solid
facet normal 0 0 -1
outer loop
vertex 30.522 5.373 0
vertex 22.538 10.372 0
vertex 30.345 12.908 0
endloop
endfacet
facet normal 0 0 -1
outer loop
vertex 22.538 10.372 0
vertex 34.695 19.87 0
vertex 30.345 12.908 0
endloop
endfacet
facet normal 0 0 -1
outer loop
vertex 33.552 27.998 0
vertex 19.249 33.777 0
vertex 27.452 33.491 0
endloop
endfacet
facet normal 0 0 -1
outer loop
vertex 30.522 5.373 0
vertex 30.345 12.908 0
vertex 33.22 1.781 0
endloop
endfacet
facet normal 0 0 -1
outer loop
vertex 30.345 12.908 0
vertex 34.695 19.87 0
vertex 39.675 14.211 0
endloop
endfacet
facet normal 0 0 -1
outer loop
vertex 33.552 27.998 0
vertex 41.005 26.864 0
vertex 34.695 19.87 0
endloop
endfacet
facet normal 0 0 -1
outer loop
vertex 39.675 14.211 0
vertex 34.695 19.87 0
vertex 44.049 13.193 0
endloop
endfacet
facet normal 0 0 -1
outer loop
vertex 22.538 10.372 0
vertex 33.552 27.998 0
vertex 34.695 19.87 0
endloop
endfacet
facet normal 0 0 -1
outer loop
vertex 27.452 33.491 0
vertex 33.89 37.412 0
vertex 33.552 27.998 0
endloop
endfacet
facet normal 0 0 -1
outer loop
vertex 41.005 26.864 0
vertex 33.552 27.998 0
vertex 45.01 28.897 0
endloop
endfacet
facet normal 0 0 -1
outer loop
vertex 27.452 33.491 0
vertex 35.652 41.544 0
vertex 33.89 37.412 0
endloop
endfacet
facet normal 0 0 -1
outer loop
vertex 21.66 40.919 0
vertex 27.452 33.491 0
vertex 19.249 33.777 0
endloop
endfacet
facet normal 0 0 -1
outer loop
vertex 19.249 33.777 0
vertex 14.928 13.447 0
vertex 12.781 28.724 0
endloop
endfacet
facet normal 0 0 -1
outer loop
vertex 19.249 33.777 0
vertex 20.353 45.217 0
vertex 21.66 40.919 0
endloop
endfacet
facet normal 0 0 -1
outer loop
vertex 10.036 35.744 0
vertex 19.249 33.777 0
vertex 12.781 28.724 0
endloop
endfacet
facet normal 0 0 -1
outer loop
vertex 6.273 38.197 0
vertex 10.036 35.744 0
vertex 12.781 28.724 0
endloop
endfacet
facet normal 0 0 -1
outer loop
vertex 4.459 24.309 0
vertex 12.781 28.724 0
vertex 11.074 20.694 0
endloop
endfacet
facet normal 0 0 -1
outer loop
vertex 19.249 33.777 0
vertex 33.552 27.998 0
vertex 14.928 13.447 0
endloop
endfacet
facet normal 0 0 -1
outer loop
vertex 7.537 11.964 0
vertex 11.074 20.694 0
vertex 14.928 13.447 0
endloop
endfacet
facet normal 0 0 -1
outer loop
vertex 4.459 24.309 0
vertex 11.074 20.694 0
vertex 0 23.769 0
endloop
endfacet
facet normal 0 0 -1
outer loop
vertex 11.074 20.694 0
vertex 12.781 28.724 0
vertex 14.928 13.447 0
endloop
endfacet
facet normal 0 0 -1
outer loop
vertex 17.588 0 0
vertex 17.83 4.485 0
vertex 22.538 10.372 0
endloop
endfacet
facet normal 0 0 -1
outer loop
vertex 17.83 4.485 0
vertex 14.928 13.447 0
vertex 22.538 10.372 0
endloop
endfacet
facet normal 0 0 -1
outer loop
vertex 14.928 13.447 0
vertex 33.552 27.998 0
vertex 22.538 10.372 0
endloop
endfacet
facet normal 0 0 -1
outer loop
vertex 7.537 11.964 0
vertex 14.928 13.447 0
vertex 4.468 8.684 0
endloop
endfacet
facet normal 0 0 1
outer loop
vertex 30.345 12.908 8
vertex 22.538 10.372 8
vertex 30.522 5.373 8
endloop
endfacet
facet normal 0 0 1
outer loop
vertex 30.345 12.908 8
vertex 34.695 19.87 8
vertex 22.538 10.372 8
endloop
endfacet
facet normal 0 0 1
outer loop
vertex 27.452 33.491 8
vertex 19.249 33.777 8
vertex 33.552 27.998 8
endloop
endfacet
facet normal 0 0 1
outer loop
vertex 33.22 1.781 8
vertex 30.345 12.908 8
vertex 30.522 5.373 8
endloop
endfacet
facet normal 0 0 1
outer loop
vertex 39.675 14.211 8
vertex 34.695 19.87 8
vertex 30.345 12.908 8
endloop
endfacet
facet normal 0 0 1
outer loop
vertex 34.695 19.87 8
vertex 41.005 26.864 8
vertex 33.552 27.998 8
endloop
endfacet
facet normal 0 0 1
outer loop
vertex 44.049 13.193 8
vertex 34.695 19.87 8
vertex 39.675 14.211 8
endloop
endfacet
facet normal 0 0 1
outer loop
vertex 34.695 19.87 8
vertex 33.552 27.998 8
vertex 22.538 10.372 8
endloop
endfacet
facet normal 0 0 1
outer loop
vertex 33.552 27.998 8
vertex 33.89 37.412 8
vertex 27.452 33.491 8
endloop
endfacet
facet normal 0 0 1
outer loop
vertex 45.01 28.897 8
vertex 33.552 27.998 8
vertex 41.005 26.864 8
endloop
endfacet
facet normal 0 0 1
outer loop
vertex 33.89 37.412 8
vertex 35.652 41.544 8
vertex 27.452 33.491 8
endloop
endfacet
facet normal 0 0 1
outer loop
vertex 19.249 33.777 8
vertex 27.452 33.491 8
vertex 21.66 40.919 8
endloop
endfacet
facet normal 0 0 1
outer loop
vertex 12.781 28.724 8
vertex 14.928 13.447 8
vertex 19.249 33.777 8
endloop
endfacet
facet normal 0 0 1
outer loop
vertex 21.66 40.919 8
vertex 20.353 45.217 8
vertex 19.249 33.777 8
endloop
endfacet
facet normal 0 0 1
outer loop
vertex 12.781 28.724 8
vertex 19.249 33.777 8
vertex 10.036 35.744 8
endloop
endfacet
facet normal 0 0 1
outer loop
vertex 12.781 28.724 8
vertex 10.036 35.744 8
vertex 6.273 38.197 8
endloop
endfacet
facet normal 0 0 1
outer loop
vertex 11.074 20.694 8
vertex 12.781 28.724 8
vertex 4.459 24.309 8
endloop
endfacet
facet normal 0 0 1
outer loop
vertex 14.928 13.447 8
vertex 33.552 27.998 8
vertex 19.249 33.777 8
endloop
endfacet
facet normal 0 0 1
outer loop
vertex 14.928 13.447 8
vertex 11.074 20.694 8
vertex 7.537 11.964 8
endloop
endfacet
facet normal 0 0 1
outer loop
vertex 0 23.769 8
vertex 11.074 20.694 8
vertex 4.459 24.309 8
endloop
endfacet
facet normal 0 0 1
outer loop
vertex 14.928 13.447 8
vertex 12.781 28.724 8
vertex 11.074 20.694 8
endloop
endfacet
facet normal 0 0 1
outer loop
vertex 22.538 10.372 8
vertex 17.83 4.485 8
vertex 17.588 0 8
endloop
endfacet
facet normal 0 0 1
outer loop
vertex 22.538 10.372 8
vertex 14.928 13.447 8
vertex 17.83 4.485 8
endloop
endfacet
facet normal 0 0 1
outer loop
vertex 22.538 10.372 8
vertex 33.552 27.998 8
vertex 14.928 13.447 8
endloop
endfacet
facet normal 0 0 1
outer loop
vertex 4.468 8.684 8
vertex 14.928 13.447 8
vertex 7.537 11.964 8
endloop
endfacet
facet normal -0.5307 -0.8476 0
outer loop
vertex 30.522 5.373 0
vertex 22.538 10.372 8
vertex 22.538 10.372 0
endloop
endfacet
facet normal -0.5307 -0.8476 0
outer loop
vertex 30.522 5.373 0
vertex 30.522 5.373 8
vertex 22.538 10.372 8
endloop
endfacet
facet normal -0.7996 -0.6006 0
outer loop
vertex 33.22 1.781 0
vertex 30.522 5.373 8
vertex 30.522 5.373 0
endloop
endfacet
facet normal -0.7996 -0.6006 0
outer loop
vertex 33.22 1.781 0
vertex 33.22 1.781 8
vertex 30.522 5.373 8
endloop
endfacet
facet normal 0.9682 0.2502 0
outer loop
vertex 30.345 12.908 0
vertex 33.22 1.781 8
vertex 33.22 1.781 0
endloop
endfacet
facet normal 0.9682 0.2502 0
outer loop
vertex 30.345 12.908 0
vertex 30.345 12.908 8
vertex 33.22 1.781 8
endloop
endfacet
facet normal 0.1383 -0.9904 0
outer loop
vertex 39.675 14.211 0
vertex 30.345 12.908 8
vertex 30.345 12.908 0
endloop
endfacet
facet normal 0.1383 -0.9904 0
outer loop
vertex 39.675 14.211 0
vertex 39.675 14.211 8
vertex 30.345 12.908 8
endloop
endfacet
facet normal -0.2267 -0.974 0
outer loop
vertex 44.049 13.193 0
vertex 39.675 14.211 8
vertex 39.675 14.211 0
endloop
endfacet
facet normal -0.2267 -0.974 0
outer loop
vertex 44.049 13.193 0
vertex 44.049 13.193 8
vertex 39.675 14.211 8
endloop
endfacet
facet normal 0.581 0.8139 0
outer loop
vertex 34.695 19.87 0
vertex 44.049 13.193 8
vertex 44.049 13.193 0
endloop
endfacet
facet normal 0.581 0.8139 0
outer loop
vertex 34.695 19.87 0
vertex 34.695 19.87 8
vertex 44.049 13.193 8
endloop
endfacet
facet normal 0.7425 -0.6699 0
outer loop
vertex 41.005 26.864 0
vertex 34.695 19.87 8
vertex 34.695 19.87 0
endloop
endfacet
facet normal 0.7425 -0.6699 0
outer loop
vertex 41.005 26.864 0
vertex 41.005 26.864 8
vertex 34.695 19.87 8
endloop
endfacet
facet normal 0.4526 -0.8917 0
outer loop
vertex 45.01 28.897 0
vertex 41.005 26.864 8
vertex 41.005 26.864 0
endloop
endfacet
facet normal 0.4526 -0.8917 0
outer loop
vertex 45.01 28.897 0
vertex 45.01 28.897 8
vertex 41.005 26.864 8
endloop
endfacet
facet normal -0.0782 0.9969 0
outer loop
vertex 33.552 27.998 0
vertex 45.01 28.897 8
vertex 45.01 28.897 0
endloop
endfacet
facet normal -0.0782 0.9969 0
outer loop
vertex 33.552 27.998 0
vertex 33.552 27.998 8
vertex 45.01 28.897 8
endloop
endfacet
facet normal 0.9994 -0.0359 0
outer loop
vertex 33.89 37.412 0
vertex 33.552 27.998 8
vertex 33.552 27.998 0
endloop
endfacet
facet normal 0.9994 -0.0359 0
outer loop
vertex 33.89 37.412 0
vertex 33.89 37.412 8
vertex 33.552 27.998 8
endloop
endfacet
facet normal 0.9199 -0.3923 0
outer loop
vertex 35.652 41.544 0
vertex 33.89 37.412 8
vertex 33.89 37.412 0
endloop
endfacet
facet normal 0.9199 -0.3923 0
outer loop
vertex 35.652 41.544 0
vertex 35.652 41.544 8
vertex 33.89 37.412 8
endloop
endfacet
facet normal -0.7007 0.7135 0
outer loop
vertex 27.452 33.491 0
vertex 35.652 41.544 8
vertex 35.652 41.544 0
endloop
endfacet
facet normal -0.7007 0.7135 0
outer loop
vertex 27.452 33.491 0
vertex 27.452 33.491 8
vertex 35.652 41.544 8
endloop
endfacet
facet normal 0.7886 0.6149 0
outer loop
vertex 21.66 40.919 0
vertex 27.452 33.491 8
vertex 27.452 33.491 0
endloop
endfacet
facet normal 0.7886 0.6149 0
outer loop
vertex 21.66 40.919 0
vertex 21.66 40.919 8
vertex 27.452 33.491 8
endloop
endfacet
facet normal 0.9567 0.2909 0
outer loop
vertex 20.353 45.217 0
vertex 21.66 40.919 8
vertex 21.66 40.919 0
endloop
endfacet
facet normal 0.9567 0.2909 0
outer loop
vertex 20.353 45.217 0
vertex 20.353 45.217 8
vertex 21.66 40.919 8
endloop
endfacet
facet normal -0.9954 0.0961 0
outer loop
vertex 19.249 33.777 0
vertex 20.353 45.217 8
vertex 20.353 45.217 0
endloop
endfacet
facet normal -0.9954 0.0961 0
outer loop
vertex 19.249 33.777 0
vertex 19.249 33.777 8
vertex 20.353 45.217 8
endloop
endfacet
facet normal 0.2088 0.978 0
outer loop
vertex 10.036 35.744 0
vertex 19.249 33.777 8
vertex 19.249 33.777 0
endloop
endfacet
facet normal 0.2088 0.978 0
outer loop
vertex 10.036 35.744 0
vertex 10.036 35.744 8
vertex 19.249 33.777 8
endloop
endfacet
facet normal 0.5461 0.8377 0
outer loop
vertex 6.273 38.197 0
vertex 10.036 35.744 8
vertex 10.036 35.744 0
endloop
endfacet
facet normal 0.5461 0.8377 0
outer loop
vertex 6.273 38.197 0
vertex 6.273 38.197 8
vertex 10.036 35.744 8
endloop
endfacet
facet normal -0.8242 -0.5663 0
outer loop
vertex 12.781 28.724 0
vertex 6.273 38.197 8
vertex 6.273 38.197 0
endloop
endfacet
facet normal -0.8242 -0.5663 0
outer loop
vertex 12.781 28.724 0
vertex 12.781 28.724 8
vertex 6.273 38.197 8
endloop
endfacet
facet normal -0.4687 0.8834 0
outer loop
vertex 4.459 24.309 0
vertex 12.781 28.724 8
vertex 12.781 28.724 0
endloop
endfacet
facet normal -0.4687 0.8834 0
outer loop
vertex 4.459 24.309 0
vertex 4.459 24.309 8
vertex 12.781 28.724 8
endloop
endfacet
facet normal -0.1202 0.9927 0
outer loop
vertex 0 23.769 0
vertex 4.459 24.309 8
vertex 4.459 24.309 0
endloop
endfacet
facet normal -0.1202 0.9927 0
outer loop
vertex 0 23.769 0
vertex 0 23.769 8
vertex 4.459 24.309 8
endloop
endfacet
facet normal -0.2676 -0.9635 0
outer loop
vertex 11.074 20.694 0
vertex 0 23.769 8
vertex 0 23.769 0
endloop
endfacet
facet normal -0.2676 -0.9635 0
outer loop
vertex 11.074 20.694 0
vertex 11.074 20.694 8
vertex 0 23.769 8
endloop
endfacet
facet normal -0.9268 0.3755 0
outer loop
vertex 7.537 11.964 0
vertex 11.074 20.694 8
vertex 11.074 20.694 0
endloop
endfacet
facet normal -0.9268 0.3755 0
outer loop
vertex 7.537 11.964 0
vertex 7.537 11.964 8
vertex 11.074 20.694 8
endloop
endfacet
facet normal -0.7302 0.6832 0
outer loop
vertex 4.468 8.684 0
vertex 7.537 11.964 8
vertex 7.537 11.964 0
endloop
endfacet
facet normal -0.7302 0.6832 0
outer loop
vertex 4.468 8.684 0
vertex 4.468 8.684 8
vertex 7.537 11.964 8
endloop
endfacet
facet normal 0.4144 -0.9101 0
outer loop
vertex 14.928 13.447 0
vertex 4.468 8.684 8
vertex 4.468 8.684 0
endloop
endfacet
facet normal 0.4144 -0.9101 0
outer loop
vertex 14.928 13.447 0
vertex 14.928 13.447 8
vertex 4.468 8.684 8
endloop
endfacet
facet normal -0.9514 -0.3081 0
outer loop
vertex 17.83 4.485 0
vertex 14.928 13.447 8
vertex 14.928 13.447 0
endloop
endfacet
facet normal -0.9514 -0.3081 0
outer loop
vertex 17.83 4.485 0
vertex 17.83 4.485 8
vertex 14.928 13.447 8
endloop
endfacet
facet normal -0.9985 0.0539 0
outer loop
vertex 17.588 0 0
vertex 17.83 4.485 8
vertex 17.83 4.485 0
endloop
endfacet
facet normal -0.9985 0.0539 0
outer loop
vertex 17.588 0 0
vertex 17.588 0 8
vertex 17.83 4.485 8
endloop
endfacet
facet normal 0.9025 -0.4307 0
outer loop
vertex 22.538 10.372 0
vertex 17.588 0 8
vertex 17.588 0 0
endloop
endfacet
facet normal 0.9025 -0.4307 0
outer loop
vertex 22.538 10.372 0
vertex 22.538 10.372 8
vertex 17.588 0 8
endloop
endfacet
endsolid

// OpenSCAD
$fn = 32;

// ----------------------------------------------------------------------
// Fan rotor section: 9 blades, 12 mm hub radius, 11 mm blades
// ----------------------------------------------------------------------

// --- parameters (mm) ---
profile_height = 8;       // extrusion height
profile_points = 27;      // points of the closed outline

profile = [[34.695, 19.87], [41.005, 26.864], [45.01, 28.897], [33.552, 27.998], [33.89, 37.412], [35.652, 41.544], [27.452, 33.491], [21.66, 40.919], [20.353, 45.217], [19.249, 33.777], [10.036, 35.744], [6.273, 38.197], [12.781, 28.724], [4.459, 24.309], [0, 23.769], [11.074, 20.694], [7.537, 11.964], [4.468, 8.684], [14.928, 13.447], [17.83, 4.485], [17.588, 0], [22.538, 10.372], [30.522, 5.373], [33.22, 1.781], [30.345, 12.908], [39.675, 14.211], [44.049, 13.193]];  // single closed polygon, 27 points, counter clockwise

// --- the one profile operation ---
linear_extrude(height = profile_height) polygon(points = profile);
